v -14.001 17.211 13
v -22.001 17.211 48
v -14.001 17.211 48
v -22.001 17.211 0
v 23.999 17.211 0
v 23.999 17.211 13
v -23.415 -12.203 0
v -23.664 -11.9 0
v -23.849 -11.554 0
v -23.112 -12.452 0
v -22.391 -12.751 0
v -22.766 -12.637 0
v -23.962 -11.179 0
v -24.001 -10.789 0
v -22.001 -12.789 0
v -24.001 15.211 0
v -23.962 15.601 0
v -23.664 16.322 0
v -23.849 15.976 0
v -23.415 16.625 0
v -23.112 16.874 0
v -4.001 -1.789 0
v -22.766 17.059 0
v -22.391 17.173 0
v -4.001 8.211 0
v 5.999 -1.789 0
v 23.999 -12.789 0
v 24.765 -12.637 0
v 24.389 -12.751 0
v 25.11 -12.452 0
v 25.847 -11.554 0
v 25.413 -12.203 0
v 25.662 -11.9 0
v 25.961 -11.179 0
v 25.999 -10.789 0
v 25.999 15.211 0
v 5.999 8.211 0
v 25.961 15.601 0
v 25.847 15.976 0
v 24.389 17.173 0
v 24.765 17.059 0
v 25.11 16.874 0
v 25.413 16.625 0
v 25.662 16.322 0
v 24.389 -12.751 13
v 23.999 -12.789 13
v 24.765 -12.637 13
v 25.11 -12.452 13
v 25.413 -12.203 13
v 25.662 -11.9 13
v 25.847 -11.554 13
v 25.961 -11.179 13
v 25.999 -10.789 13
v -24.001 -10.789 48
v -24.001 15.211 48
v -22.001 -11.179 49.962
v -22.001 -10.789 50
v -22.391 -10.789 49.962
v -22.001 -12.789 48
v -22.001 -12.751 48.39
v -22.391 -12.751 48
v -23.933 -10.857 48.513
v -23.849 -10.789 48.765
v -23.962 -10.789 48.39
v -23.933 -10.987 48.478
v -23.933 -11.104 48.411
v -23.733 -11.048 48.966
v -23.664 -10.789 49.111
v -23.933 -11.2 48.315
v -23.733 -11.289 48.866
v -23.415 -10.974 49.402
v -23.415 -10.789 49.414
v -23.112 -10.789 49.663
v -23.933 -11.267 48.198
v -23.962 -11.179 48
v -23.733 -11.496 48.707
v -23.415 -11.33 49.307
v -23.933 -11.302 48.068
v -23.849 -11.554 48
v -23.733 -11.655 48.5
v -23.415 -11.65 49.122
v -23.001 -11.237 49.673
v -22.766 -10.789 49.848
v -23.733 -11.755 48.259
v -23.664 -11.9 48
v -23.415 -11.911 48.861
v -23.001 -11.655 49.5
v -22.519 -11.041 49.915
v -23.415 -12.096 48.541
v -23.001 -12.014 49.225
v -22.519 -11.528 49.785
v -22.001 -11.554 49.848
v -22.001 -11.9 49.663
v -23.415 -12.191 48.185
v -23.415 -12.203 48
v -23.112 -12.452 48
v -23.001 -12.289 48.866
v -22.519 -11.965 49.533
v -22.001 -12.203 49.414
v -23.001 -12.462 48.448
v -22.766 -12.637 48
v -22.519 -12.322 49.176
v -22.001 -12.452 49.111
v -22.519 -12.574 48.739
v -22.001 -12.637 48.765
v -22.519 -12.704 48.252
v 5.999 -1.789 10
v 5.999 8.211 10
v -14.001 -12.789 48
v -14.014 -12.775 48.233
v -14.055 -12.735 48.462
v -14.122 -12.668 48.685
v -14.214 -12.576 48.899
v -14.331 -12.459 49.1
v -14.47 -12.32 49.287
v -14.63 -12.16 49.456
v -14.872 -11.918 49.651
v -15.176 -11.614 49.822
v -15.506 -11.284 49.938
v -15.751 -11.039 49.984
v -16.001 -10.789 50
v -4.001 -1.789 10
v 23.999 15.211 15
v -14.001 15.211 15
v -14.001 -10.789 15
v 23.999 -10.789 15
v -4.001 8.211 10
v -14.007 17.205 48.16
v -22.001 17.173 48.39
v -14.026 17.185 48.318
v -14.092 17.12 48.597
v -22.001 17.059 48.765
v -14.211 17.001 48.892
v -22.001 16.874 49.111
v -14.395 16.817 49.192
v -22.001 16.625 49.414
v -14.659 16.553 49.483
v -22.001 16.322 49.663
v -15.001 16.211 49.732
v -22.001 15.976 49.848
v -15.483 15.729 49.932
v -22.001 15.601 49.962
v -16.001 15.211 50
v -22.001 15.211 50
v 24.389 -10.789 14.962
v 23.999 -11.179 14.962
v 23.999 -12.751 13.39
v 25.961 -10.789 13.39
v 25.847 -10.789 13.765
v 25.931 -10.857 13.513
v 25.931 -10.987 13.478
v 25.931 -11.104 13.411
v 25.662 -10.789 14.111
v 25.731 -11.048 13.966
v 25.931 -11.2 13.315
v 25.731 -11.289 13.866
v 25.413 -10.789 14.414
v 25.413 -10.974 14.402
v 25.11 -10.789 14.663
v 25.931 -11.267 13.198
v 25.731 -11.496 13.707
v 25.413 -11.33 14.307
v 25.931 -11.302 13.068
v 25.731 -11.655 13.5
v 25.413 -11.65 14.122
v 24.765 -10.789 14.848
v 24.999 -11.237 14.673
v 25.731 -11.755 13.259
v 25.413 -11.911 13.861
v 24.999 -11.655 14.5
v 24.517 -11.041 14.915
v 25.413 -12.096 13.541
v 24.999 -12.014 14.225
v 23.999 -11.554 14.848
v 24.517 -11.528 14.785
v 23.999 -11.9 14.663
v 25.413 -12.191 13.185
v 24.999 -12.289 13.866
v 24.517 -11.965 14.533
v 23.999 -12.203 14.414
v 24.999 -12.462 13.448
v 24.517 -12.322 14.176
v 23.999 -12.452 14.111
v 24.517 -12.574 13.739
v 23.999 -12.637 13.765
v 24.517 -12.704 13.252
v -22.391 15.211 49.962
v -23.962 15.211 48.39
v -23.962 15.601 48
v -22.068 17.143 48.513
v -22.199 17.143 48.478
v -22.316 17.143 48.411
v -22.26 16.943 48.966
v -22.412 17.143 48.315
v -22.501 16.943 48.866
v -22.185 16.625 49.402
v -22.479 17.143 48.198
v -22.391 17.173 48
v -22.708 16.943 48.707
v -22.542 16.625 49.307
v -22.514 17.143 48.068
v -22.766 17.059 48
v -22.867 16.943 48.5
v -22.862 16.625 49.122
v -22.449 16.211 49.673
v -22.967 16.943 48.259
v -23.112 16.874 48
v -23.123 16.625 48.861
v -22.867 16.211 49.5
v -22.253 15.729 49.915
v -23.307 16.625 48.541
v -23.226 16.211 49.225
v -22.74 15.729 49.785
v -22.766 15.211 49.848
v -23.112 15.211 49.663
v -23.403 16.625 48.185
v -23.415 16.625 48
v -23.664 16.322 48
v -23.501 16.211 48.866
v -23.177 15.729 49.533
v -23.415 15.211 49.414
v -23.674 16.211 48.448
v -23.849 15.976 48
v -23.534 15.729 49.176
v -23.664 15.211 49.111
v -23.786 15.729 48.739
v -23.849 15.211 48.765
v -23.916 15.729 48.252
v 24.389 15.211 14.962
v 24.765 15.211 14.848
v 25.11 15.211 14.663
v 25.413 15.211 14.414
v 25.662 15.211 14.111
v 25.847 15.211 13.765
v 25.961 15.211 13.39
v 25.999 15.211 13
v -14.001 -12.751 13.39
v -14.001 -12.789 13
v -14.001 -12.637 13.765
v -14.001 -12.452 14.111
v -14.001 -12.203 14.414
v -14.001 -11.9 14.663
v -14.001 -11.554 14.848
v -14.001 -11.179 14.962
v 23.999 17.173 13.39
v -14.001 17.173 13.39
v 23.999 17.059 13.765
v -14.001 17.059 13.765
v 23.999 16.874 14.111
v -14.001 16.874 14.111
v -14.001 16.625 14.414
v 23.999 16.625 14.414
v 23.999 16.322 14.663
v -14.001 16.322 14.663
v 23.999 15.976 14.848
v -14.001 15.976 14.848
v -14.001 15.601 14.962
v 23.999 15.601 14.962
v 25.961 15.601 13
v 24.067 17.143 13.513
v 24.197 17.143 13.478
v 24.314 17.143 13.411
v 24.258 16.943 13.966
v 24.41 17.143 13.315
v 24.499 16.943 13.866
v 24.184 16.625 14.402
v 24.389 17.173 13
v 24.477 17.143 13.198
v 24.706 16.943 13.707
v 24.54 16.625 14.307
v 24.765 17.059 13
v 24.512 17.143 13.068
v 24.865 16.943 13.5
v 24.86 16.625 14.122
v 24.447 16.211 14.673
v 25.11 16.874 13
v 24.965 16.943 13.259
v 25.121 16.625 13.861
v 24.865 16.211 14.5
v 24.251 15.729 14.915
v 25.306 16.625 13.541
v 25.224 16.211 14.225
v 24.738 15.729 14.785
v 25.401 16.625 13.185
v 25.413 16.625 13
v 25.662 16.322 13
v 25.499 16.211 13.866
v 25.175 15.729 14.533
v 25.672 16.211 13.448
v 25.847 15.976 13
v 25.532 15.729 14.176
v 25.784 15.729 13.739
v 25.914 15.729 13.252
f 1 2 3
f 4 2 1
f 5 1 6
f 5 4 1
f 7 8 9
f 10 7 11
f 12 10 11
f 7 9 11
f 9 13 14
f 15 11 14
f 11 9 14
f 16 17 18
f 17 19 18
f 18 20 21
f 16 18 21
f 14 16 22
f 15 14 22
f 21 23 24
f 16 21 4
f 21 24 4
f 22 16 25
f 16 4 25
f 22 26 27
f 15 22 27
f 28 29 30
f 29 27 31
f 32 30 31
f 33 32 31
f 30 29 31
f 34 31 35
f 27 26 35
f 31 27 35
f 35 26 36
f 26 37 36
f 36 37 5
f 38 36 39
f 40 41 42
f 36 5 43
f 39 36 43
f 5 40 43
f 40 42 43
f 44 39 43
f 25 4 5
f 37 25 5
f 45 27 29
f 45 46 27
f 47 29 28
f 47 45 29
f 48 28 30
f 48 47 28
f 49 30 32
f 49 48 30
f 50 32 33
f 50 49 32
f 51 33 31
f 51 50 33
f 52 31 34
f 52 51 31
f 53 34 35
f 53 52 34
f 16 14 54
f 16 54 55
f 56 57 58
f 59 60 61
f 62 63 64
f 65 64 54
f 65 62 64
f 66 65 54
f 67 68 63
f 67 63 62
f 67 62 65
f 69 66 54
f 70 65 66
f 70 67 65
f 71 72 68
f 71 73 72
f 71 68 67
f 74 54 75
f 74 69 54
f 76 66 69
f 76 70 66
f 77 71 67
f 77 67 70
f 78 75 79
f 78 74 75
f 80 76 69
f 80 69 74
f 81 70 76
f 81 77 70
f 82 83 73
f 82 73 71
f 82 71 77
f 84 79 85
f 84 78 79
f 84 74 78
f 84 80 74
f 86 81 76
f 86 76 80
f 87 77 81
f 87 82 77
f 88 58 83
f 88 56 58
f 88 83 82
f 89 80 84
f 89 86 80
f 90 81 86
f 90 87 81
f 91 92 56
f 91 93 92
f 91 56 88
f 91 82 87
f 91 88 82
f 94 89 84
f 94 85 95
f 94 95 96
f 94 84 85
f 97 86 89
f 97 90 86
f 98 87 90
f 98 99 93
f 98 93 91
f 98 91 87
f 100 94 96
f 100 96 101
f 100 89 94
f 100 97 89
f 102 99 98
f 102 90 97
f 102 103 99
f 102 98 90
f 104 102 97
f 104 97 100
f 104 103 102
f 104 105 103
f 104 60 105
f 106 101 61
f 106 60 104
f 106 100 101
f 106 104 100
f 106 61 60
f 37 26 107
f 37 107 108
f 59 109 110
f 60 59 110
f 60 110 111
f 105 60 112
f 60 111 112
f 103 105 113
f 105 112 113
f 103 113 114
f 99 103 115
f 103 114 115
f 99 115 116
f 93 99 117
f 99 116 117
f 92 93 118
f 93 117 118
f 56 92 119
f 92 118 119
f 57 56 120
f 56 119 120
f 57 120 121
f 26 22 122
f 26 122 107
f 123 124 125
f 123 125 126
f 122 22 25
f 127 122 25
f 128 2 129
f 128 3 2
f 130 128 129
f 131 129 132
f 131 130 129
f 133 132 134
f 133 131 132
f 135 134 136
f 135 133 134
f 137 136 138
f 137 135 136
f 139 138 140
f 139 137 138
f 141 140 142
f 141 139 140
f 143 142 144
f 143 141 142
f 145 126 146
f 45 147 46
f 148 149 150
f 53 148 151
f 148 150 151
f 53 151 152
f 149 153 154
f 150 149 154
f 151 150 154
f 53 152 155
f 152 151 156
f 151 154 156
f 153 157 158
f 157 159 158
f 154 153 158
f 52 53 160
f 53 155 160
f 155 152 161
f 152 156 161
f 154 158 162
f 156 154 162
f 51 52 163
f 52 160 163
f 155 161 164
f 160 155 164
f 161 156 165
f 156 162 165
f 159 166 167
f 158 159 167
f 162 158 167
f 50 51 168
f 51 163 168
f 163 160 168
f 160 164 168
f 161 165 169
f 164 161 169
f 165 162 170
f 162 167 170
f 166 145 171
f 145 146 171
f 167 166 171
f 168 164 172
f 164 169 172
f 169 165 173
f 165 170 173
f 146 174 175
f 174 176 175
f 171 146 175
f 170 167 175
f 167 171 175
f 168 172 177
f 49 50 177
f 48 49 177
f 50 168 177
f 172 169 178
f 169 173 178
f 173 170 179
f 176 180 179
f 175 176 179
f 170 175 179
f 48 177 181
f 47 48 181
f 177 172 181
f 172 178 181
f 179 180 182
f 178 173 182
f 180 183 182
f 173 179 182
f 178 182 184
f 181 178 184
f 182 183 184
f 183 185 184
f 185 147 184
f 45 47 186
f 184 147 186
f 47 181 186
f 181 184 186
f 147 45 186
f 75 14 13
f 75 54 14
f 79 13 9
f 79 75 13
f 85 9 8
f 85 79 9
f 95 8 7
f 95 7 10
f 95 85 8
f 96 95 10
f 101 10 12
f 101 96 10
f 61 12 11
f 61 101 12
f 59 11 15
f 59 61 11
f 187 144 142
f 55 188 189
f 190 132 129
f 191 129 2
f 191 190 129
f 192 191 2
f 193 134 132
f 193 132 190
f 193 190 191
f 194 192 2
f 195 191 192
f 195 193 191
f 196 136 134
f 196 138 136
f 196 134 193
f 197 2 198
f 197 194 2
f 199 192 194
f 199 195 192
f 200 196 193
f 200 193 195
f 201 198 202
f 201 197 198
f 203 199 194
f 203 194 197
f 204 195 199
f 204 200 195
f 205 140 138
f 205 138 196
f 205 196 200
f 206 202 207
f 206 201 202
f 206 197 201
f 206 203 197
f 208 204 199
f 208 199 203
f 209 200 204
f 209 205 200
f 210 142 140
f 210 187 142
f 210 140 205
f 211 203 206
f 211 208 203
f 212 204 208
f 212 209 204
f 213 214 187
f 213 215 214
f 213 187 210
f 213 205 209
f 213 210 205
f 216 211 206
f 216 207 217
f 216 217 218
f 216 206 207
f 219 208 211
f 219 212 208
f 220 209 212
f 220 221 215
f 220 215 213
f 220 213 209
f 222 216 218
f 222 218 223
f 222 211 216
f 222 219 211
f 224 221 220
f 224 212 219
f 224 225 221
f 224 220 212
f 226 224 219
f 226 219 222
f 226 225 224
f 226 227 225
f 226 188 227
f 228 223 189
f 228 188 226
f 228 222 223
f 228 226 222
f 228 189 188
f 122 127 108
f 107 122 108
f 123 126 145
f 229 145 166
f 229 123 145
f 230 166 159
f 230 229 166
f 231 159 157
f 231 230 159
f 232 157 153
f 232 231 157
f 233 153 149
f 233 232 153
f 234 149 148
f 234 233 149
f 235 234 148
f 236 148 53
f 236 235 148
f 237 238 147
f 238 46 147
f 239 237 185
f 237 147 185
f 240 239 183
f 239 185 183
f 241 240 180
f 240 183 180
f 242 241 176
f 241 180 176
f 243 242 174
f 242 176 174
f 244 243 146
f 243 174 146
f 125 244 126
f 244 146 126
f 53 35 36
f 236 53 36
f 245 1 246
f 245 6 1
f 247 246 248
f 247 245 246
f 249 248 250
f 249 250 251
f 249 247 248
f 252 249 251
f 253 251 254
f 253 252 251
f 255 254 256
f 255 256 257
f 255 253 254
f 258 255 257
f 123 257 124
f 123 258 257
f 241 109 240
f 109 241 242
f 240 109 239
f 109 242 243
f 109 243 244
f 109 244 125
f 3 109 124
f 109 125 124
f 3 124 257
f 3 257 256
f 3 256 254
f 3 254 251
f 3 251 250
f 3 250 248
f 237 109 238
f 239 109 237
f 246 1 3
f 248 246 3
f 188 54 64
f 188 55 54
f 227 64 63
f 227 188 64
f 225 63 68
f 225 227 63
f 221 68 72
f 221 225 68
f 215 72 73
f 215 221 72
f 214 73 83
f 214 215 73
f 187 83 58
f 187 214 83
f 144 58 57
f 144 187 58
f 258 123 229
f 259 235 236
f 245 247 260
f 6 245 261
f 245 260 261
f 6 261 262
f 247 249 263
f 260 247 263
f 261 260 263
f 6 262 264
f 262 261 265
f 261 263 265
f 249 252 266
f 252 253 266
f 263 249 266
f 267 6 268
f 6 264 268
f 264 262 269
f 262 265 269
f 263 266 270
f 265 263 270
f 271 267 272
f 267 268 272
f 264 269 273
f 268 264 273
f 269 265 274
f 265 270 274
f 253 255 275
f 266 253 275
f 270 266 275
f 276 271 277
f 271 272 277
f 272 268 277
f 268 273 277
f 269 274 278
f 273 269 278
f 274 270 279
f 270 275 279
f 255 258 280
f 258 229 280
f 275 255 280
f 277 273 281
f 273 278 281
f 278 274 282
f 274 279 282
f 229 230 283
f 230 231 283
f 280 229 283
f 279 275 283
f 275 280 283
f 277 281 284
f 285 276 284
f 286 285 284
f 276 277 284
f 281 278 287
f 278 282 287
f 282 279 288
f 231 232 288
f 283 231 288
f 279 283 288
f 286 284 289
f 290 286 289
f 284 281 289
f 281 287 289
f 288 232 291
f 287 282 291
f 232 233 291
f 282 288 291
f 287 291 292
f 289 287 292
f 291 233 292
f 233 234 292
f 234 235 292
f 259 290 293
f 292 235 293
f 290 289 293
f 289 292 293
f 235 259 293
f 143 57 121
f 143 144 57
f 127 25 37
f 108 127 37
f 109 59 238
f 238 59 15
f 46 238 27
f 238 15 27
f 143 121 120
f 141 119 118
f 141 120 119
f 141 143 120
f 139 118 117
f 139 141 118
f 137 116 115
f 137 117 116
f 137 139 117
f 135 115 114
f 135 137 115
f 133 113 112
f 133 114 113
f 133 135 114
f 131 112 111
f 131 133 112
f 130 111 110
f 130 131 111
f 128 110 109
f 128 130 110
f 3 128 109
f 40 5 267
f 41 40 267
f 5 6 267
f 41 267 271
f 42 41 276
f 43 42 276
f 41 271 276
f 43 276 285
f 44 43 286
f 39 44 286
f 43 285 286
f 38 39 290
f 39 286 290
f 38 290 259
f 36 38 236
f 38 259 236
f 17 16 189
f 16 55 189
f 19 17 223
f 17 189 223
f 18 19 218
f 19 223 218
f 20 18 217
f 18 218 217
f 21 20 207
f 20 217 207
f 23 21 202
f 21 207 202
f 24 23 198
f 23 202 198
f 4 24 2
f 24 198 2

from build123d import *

# Parameters (mm, degrees)
F0_W     = 40
F0_H     = 30
F1_DEPTH = 15
F0_W_2   = 10
F2_DEPTH = 50
F3_W     = 10
F3_H     = 10
F4_DEPTH = 10
F5_R     = 2


with BuildPart() as f1:
    # F0 (on Top) → F1 (new body)
    with BuildSketch(Plane.XY):
        with Locations((5.999135, 2.211004)):
            Rectangle(F0_W, F0_H)
    extrude(amount=F1_DEPTH)

    # F0 (on Top) → F2 (join)
    with BuildSketch(Plane.XY):
        with Locations((-19.000865, 2.211004)):
            Rectangle(F0_W_2, F0_H)
    extrude(amount=F2_DEPTH)

    # F3 (on face) → F4 (cut)
    with BuildSketch(Plane.XY):
        with Locations((0.999135, 3.211004)):
            Rectangle(F3_W, F3_H)
    extrude(amount=F4_DEPTH, mode=Mode.SUBTRACT)

    # F5
    f5_edges = [f1.edges().sort_by_distance(p)[0] for p in [
        (-19.000865, -12.788996, 50),
        (-14.000865, 2.211004, 50),
        (-24.000865, 2.211004, 50),
        (-19.000865, 17.211004, 50),
        (5.999135, -12.788996, 15),
        (25.999135, 2.211004, 15),
        (5.999135, 17.211004, 15),
        (25.999135, 17.211004, 7.5),
        (25.999135, -12.788996, 7.5),
        (-24.000865, 17.211004, 25),
        (-24.000865, -12.788996, 25),
    ]]
    fillet(f5_edges, radius=F5_R)


solid = f1.part
